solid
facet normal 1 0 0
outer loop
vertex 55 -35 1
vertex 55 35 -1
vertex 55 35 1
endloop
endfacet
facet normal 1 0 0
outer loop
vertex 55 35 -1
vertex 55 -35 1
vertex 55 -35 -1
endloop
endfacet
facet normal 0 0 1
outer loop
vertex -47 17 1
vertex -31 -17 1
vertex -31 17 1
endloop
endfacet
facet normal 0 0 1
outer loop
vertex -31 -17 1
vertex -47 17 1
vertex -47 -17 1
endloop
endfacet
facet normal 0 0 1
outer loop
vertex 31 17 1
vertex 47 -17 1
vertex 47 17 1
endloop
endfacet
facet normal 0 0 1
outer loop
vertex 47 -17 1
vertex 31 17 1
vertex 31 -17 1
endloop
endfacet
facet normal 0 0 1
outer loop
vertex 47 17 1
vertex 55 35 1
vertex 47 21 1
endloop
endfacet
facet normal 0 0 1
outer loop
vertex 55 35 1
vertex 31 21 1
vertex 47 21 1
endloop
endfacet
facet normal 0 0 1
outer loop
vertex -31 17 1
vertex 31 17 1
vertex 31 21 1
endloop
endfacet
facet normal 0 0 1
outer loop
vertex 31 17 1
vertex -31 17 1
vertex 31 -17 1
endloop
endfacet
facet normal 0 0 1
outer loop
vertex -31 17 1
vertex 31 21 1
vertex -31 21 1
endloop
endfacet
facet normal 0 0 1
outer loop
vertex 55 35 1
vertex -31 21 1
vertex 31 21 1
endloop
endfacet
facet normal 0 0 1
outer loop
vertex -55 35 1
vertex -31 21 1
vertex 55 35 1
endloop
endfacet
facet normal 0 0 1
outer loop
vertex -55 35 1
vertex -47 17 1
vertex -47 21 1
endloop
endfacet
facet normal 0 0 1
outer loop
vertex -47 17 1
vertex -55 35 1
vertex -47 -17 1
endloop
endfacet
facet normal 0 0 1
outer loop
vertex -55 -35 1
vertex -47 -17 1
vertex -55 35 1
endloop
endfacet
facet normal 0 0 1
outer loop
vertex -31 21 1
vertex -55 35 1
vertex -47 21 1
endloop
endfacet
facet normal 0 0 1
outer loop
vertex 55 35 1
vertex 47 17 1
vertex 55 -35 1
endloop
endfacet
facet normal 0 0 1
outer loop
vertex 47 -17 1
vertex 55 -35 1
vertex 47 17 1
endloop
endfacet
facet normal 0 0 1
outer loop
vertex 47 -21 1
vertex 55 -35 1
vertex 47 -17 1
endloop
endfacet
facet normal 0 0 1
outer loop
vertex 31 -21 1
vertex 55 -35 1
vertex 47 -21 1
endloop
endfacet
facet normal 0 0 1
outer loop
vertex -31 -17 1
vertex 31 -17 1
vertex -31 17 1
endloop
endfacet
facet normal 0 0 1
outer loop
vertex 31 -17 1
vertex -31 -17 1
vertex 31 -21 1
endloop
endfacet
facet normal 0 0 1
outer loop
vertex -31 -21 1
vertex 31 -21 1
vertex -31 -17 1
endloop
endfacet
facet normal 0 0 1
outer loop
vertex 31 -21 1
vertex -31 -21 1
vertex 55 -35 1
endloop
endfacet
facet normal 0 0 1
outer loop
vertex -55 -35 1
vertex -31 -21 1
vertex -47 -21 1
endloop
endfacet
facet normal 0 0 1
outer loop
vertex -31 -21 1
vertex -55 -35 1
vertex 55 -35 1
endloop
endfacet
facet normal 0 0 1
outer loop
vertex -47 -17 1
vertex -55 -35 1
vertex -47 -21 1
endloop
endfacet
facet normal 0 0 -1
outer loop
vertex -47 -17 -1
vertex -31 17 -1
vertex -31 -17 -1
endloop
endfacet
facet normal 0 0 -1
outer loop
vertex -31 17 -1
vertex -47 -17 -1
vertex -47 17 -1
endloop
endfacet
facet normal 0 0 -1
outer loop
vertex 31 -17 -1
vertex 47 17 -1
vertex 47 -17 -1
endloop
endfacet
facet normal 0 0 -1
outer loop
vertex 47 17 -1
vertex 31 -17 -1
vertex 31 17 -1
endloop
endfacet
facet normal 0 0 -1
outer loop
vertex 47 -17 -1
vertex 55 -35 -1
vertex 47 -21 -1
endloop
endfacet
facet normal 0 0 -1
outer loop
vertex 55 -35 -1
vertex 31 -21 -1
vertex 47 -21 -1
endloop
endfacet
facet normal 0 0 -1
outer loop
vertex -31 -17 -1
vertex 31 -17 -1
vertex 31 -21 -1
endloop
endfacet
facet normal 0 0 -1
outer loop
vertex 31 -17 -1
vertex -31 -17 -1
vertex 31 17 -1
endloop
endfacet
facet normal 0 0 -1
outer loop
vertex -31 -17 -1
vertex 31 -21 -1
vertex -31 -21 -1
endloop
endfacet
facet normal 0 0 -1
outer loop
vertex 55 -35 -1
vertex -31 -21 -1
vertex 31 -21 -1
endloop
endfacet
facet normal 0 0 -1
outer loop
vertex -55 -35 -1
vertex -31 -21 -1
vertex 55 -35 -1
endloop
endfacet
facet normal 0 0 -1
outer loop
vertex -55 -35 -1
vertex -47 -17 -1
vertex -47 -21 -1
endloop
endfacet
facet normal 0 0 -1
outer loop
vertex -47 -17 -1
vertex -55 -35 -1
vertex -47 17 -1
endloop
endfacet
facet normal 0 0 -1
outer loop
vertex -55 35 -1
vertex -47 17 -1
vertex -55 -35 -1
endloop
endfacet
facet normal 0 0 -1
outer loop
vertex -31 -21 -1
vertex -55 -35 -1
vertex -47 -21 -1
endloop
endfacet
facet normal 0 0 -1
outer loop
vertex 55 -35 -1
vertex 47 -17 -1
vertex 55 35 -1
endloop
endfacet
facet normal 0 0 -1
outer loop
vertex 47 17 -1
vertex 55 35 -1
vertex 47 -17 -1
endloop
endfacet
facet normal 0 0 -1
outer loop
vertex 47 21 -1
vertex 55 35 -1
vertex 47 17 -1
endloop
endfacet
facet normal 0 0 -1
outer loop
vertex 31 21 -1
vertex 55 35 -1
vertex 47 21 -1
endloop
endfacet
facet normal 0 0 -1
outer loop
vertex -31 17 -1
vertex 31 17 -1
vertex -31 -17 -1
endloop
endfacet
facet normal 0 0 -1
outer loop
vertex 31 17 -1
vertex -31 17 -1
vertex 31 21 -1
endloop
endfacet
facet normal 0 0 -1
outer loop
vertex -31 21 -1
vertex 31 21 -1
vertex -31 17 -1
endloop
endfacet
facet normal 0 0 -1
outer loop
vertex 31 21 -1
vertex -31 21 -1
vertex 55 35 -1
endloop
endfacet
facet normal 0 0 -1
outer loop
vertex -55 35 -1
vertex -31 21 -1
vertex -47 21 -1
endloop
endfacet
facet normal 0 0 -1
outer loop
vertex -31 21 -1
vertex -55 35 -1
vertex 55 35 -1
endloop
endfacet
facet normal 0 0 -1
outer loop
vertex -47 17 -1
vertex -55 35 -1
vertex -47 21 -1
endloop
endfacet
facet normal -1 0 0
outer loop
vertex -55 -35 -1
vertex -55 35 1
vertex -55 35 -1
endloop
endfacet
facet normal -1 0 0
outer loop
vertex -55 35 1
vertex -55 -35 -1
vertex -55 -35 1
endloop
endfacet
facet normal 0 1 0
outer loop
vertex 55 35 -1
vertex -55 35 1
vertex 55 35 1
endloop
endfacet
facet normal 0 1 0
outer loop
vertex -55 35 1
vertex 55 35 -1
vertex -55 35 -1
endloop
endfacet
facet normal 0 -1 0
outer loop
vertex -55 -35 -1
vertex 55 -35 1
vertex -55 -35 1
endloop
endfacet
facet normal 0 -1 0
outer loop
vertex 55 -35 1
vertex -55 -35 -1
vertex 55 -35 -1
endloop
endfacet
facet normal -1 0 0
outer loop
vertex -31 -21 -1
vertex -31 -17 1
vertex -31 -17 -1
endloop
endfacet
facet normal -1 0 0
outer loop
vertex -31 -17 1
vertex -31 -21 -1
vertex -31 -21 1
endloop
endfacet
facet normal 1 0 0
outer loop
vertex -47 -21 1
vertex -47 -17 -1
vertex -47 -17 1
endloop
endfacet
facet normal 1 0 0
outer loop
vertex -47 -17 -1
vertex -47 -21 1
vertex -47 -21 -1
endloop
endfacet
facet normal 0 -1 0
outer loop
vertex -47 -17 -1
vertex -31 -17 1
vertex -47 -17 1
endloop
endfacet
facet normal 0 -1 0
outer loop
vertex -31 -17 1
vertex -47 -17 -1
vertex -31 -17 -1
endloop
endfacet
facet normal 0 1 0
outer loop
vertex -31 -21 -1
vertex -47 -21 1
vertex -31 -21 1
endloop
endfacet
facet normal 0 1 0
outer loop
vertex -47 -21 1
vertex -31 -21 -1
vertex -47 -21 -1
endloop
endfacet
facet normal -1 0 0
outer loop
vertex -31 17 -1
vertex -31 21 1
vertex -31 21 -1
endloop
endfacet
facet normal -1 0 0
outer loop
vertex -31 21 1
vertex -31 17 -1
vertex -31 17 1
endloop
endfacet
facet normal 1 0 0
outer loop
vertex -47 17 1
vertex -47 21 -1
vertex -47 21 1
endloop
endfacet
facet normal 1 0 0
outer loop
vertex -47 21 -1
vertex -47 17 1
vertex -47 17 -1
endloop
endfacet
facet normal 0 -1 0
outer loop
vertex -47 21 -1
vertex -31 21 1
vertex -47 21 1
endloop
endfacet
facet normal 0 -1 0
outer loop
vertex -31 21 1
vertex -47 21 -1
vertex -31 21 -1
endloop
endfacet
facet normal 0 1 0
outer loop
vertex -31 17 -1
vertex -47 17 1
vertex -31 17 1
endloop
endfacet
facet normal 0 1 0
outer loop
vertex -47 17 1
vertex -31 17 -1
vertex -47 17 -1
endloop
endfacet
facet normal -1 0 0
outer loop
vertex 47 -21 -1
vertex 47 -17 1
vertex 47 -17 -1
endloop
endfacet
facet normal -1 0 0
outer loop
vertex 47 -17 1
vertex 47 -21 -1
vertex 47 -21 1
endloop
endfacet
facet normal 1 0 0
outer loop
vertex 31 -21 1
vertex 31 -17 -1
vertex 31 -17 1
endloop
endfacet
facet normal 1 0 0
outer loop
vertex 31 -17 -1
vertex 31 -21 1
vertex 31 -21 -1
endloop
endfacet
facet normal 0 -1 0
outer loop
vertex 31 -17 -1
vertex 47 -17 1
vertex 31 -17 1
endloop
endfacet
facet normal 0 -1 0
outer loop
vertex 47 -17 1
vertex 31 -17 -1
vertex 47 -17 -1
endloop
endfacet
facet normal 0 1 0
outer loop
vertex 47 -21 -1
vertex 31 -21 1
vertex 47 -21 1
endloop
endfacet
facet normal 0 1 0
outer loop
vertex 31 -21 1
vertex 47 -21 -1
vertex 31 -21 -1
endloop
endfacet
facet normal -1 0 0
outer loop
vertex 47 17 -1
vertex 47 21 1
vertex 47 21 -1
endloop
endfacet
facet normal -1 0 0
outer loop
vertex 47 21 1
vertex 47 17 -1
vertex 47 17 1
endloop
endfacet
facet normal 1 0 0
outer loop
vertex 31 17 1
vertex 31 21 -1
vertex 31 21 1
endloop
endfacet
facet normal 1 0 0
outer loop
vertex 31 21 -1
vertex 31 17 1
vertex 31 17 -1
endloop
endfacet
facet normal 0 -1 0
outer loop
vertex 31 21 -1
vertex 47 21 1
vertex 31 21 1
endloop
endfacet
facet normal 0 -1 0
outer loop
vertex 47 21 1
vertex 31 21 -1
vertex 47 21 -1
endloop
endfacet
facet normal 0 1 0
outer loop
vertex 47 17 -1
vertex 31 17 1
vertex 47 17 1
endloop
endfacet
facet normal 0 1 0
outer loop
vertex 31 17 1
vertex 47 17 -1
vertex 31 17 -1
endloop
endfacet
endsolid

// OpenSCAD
// ========================================
// a 110 x 70 x 2 mm plate with four 16 x 4 mm slots
// NeuroCAD canonical IR; dimensions are millimetres
// ========================================
$fn = 48;

difference() {
  cube(size=[110, 70, 2], center=true);
  translate([-39, -19, 0]) {
    cube(size=[16, 4, 4], center=true);
  }
  translate([-39, 19, 0]) {
    cube(size=[16, 4, 4], center=true);
  }
  translate([39, -19, 0]) {
    cube(size=[16, 4, 4], center=true);
  }
  translate([39, 19, 0]) {
    cube(size=[16, 4, 4], center=true);
  }
}
